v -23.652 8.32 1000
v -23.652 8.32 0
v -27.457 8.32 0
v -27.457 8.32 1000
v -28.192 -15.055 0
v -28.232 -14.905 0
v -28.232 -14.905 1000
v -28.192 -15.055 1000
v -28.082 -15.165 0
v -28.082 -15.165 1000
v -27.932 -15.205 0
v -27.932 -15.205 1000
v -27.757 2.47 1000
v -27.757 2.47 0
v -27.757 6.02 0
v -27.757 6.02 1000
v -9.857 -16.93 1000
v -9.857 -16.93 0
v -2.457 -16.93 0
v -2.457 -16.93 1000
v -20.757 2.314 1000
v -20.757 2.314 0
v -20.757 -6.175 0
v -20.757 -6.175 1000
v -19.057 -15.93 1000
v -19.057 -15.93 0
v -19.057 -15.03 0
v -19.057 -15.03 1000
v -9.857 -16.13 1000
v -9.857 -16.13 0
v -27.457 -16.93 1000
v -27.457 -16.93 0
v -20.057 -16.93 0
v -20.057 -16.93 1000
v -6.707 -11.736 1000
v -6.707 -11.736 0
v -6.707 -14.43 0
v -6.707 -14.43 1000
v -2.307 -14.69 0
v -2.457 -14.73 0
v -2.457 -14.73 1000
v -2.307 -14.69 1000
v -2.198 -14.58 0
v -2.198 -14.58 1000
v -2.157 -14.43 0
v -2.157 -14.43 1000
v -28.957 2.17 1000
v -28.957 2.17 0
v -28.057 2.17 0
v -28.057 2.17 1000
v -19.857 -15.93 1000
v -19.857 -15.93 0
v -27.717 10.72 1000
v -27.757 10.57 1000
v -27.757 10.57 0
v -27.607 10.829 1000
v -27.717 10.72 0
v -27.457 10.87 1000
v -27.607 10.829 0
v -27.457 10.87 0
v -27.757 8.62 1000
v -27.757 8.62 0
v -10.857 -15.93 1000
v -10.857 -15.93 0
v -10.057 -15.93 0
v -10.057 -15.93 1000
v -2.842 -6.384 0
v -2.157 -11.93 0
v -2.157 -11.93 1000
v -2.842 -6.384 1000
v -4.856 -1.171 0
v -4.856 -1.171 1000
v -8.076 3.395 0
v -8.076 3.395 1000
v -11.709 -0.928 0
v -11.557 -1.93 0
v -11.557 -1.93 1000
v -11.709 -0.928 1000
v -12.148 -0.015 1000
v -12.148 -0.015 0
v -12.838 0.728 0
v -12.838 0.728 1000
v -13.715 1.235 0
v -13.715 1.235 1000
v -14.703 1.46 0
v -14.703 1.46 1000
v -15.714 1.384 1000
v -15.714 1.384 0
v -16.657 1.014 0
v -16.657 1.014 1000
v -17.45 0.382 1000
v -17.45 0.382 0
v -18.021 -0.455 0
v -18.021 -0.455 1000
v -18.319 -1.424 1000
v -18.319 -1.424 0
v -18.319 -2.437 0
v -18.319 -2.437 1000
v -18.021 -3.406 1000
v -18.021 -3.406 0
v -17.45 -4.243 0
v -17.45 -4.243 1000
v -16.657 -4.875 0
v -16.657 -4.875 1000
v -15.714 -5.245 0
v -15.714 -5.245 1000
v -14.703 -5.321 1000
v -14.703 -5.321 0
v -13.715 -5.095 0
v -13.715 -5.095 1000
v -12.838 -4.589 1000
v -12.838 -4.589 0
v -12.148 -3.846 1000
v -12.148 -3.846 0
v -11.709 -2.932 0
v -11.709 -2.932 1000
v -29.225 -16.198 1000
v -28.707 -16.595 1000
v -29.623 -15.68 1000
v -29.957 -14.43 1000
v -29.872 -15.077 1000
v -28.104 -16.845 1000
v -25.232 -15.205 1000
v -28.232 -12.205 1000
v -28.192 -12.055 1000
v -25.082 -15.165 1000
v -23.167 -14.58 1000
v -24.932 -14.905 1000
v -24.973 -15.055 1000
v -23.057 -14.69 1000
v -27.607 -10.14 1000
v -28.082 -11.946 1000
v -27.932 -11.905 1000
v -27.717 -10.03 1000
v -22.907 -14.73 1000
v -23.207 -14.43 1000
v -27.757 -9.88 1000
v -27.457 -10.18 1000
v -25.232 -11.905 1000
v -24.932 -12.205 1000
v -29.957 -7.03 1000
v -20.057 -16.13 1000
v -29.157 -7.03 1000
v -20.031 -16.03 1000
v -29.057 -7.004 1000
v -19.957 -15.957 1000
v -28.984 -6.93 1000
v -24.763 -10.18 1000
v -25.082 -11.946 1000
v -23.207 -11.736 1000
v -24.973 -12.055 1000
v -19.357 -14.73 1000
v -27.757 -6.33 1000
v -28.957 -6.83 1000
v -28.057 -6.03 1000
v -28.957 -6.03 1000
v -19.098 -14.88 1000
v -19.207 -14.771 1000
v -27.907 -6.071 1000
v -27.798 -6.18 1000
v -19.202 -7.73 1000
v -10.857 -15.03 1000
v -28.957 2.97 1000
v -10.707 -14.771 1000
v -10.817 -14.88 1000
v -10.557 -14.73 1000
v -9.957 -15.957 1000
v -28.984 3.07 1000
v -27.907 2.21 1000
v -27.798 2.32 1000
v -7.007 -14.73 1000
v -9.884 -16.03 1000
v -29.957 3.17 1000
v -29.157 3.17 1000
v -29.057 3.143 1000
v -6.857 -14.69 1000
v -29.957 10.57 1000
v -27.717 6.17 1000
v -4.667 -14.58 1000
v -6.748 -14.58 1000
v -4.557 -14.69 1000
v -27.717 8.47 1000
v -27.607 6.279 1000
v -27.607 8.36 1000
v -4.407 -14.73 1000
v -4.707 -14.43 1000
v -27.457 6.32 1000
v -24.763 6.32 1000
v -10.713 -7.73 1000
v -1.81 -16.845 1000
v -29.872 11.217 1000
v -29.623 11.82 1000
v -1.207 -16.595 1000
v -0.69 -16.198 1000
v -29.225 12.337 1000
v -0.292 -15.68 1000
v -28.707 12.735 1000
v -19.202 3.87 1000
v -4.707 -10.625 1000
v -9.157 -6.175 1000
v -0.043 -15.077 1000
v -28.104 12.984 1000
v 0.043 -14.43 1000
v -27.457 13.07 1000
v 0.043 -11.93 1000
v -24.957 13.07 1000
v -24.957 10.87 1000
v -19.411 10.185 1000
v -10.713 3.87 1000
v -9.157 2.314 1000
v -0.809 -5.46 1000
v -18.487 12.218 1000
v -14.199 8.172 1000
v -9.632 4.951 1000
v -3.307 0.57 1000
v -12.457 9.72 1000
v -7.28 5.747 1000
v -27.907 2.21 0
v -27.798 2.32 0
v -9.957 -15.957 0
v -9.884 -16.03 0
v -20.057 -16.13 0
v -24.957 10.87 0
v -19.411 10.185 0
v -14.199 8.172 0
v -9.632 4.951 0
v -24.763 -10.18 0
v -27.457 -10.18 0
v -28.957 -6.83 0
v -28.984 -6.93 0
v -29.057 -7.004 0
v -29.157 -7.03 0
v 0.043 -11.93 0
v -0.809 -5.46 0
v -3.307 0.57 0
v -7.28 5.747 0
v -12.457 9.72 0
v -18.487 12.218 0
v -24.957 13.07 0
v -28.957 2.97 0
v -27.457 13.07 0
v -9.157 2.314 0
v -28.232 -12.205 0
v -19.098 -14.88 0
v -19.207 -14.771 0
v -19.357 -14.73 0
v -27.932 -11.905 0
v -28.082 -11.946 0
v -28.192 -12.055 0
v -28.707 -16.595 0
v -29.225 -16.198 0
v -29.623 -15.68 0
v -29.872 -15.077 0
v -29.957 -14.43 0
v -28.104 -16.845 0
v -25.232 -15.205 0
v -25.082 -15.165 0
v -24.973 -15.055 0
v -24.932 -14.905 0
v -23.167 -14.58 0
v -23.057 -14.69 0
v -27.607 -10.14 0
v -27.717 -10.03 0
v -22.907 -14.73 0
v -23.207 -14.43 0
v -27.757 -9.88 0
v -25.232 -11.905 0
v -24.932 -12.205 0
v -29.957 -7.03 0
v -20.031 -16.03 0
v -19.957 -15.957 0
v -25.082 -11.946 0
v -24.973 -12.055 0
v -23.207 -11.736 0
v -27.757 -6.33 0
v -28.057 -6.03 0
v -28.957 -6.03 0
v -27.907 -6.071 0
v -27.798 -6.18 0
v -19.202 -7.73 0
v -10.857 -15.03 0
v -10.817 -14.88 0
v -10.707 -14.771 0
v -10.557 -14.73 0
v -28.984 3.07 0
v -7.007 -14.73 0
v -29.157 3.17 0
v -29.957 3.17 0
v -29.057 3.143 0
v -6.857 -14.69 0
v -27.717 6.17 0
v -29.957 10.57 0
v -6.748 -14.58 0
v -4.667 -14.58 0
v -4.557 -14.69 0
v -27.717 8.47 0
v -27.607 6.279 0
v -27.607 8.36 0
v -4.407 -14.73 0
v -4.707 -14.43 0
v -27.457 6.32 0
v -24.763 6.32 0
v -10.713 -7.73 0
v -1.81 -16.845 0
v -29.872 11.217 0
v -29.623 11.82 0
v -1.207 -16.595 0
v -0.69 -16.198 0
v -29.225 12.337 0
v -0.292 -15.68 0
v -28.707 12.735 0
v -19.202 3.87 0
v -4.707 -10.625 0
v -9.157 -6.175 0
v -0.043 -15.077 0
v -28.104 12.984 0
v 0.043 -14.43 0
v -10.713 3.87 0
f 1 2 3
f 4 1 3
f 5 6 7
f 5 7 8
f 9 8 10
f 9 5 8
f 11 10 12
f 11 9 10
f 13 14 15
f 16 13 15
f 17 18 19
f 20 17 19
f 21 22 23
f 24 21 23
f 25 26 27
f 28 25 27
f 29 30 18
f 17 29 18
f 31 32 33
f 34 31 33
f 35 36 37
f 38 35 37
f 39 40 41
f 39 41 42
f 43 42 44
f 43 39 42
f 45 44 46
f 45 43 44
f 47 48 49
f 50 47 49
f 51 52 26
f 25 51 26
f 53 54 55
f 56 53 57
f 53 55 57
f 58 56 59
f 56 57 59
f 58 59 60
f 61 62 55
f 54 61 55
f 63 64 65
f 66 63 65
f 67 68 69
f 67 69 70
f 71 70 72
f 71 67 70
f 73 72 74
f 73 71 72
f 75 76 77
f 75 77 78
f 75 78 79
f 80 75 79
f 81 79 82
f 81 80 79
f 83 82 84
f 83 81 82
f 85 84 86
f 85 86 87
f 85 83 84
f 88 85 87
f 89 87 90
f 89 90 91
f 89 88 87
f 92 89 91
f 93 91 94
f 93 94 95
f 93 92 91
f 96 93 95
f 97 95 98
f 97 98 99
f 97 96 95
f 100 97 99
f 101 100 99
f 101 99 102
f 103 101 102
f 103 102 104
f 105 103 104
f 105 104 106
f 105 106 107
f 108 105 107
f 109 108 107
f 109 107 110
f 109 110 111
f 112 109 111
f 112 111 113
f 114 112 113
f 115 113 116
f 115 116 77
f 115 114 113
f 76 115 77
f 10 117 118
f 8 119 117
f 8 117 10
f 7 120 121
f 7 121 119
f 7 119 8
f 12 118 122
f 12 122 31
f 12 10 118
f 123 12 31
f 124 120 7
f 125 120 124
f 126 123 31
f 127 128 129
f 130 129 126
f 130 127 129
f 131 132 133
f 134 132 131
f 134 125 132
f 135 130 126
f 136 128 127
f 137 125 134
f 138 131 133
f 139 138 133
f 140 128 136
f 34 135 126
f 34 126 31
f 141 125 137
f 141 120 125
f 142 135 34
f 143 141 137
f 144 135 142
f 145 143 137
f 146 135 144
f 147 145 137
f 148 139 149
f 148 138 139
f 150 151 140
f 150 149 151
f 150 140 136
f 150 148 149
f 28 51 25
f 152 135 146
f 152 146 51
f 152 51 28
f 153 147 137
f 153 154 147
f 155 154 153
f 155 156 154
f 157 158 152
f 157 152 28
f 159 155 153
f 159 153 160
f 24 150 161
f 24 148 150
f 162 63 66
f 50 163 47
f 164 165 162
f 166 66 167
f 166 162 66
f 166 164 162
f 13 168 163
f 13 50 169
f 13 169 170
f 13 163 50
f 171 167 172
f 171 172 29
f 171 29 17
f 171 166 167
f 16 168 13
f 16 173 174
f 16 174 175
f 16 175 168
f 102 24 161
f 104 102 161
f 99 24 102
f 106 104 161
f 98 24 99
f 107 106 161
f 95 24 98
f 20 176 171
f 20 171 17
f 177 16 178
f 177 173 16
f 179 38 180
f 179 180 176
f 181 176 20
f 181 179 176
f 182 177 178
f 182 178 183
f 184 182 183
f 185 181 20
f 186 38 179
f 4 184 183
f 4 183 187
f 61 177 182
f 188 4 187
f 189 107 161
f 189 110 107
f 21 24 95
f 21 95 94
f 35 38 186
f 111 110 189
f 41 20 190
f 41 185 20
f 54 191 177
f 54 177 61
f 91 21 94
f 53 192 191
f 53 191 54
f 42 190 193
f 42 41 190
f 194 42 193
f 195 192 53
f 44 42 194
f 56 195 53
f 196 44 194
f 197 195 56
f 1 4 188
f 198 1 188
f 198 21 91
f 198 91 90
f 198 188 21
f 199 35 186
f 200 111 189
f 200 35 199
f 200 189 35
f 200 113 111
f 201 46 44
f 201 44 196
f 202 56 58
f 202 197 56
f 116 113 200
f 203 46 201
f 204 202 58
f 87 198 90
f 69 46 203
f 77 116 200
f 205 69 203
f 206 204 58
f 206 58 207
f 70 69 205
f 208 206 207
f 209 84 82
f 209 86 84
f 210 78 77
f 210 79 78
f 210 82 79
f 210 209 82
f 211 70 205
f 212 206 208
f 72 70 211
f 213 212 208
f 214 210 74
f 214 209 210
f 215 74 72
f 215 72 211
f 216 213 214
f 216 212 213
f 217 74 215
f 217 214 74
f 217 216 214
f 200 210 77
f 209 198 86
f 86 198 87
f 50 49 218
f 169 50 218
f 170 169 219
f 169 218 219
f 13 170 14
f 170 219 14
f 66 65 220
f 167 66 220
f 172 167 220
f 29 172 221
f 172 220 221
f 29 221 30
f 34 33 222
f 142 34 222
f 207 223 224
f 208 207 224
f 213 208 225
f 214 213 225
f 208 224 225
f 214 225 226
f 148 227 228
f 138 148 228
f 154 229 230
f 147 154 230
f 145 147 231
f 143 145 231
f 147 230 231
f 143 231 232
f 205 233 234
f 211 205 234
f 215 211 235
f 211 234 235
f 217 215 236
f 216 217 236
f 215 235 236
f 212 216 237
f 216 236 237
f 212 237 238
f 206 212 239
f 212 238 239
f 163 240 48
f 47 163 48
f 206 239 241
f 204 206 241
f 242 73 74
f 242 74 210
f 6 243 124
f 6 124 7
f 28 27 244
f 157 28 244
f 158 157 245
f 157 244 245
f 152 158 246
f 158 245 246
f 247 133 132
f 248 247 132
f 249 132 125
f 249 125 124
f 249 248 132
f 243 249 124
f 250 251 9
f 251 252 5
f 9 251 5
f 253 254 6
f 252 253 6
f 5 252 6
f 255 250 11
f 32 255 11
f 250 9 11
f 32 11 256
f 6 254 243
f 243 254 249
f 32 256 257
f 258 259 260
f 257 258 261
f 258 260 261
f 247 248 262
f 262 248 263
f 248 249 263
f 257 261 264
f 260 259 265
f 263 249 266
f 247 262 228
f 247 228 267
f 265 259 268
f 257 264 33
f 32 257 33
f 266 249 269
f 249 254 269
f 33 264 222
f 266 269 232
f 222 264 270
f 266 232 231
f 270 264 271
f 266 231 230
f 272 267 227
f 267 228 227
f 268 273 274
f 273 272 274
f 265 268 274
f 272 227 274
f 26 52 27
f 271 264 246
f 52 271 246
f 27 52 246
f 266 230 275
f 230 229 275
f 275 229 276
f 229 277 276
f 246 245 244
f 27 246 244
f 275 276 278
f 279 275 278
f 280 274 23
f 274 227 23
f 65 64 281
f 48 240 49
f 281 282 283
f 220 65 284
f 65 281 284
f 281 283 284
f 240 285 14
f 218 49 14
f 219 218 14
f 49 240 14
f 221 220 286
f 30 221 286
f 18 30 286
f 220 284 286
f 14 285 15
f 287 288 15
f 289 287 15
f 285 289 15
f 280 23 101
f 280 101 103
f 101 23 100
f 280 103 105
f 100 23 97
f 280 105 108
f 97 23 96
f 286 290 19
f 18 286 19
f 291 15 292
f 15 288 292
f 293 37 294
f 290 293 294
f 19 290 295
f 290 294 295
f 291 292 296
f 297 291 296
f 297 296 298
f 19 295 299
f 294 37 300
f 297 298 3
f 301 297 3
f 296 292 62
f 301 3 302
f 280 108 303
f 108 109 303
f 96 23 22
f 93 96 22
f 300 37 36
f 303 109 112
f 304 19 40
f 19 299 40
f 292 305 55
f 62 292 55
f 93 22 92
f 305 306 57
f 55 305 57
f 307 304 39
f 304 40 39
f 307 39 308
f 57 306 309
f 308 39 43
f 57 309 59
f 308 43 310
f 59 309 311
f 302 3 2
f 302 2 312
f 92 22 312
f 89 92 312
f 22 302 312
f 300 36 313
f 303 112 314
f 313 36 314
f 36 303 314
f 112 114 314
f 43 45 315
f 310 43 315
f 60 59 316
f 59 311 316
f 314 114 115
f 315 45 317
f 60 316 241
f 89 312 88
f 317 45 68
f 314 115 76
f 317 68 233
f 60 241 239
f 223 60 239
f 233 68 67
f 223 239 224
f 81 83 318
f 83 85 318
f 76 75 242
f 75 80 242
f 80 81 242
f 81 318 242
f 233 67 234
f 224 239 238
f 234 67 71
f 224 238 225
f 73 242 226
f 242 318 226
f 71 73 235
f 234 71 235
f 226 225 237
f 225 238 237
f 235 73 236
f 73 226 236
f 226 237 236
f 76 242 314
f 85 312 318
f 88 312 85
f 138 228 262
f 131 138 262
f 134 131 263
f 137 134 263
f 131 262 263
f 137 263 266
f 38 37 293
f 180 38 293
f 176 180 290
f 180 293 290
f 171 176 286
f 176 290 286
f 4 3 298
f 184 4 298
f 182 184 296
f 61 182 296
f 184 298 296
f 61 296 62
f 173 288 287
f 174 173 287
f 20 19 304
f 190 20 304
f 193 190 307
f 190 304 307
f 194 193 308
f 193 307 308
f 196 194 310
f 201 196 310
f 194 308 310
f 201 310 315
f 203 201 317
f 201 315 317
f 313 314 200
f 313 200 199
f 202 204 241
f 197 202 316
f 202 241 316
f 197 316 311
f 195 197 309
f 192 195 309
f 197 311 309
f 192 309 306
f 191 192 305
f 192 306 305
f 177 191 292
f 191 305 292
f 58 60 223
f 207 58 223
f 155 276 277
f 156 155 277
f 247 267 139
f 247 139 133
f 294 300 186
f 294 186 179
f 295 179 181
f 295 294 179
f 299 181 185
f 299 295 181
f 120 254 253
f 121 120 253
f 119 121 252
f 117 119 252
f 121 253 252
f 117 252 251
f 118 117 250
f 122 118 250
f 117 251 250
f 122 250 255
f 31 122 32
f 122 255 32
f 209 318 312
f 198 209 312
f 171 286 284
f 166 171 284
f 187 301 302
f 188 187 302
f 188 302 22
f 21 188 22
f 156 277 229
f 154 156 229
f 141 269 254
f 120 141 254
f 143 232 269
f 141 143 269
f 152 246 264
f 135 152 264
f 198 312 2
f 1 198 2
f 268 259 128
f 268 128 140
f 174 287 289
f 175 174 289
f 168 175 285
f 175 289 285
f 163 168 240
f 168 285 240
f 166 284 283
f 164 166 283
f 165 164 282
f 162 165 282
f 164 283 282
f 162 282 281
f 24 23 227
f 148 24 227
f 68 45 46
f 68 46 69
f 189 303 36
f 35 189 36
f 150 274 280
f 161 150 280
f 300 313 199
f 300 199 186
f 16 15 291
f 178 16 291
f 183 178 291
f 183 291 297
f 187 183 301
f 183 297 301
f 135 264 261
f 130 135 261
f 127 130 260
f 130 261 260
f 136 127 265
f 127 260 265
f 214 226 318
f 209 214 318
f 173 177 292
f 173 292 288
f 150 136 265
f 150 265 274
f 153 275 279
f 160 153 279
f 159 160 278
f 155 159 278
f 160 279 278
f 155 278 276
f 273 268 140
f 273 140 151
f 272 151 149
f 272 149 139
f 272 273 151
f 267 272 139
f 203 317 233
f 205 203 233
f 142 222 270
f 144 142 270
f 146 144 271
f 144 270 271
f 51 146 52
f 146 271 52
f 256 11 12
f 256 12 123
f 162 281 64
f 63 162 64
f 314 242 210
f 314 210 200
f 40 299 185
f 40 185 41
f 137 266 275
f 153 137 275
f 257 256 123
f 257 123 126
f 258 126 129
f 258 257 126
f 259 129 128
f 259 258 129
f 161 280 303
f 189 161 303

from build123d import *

# Parameters (mm, degrees)
SKETCH_1_R      = 3.4
EXTRUDE_1_DEPTH = 1000


with BuildPart() as part:
    # 草图1 → 凸台-拉伸1 (new body)
    with BuildSketch(Plane.XY):
        with BuildLine():
            Line((-29.957449905, -7.030330124), (-29.957449905, -14.430330124))
            ThreePointArc((-29.957449905, -14.430330124), (-29.225216858, -16.198097077), (-27.457449905, -16.930330124))
            Line((-27.457449905, -16.930330124), (-20.057449905, -16.930330124))
            Line((-20.057449905, -16.930330124), (-20.057449905, -16.130330124))
            ThreePointArc((-20.057449905, -16.130330124), (-19.998871261, -15.988908768), (-19.857449905, -15.930330124))
            Line((-19.857449905, -15.930330124), (-19.057449905, -15.930330124))
            Line((-19.057449905, -15.930330124), (-19.057449905, -15.030330124))
            ThreePointArc((-19.057449905, -15.030330124), (-19.145317871, -14.818198089), (-19.357449905, -14.730330124))
            Line((-19.357449905, -14.730330124), (-22.907449905, -14.730330124))
            ThreePointArc((-22.907449905, -14.730330124), (-23.11958194, -14.642462158), (-23.207449905, -14.430330124))
            Line((-23.207449905, -14.430330124), (-23.207449905, -11.735965042))
            Line((-23.207449905, -11.735965042), (-19.201814987, -7.730330124))
            Line((-19.201814987, -7.730330124), (-10.713084824, -7.730330124))
            Line((-10.713084824, -7.730330124), (-6.707449905, -11.735965042))
            Line((-6.707449905, -11.735965042), (-6.707449905, -14.430330124))
            ThreePointArc((-6.707449905, -14.430330124), (-6.795317871, -14.642462158), (-7.007449905, -14.730330124))
            Line((-7.007449905, -14.730330124), (-10.557449905, -14.730330124))
            ThreePointArc((-10.557449905, -14.730330124), (-10.76958194, -14.818198089), (-10.857449905, -15.030330124))
            Line((-10.857449905, -15.030330124), (-10.857449905, -15.930330124))
            Line((-10.857449905, -15.930330124), (-10.057449905, -15.930330124))
            ThreePointArc((-10.057449905, -15.930330124), (-9.916028549, -15.988908768), (-9.857449905, -16.130330124))
            Line((-9.857449905, -16.130330124), (-9.857449905, -16.930330124))
            Line((-9.857449905, -16.930330124), (-2.457449905, -16.930330124))
            ThreePointArc((-2.457449905, -16.930330124), (-0.689682952, -16.198097077), (0.042550095, -14.430330124))
            Line((0.042550095, -14.430330124), (0.042550095, -11.930330124))
            ThreePointArc((0.042550095, -11.930330124), (-7.279780376, 5.747339406), (-24.957449905, 13.069669876))
            Line((-24.957449905, 13.069669876), (-27.457449905, 13.069669876))
            ThreePointArc((-27.457449905, 13.069669876), (-29.225216858, 12.337436829), (-29.957449905, 10.569669876))
            Line((-29.957449905, 10.569669876), (-29.957449905, 3.169669876))
            Line((-29.957449905, 3.169669876), (-29.157449905, 3.169669876))
            ThreePointArc((-29.157449905, 3.169669876), (-29.016028549, 3.111091232), (-28.957449905, 2.969669876))
            Line((-28.957449905, 2.969669876), (-28.957449905, 2.169669876))
            Line((-28.957449905, 2.169669876), (-28.057449905, 2.169669876))
            ThreePointArc((-28.057449905, 2.169669876), (-27.845317871, 2.257537842), (-27.757449905, 2.469669876))
            Line((-27.757449905, 2.469669876), (-27.757449905, 6.019669876))
            ThreePointArc((-27.757449905, 6.019669876), (-27.66958194, 6.231801911), (-27.457449905, 6.319669876))
            Line((-27.457449905, 6.319669876), (-24.763084824, 6.319669876))
            Line((-24.763084824, 6.319669876), (-20.757449905, 2.314034958))
            Line((-20.757449905, 2.314034958), (-20.757449905, -6.174695205))
            Line((-20.757449905, -6.174695205), (-24.763084824, -10.180330124))
            Line((-24.763084824, -10.180330124), (-27.457449905, -10.180330124))
            ThreePointArc((-27.457449905, -10.180330124), (-27.66958194, -10.092462158), (-27.757449905, -9.880330124))
            Line((-27.757449905, -9.880330124), (-27.757449905, -6.330330124))
            ThreePointArc((-27.757449905, -6.330330124), (-27.845317871, -6.118198089), (-28.057449905, -6.030330124))
            Line((-28.057449905, -6.030330124), (-28.957449905, -6.030330124))
            Line((-28.957449905, -6.030330124), (-28.957449905, -6.830330124))
            ThreePointArc((-28.957449905, -6.830330124), (-29.016028549, -6.97175148), (-29.157449905, -7.030330124))
            Line((-29.157449905, -7.030330124), (-29.957449905, -7.030330124))
        make_face()
        with Locations((-14.957449905, -1.930330124)):
            Circle(SKETCH_1_R, mode=Mode.SUBTRACT)
        with BuildLine():
            Line((-9.632006825, 4.950747875), (-10.713084824, 3.869669876))
            Line((-10.713084824, 3.869669876), (-19.201814987, 3.869669876))
            Line((-19.201814987, 3.869669876), (-23.651814987, 8.319669876))
            Line((-23.651814987, 8.319669876), (-27.457449905, 8.319669876))
            ThreePointArc((-27.457449905, 8.319669876), (-27.66958194, 8.407537842), (-27.757449905, 8.619669876))
            Line((-27.757449905, 8.619669876), (-27.757449905, 10.569669876))
            ThreePointArc((-27.757449905, 10.569669876), (-27.66958194, 10.781801911), (-27.457449905, 10.869669876))
            Line((-27.457449905, 10.869669876), (-24.957449905, 10.869669876))
            ThreePointArc((-24.957449905, 10.869669876), (-16.743089868, 9.338527137), (-9.632006825, 4.950747875))
        make_face(mode=Mode.SUBTRACT)
        with BuildLine():
            Line((-27.932449905, -15.205330124), (-25.232449905, -15.205330124))
            ThreePointArc((-25.232449905, -15.205330124), (-25.020317871, -15.117462158), (-24.932449905, -14.905330124))
            Line((-24.932449905, -14.905330124), (-24.932449905, -12.205330124))
            ThreePointArc((-24.932449905, -12.205330124), (-25.020317871, -11.993198089), (-25.232449905, -11.905330124))
            Line((-25.232449905, -11.905330124), (-27.932449905, -11.905330124))
            ThreePointArc((-27.932449905, -11.905330124), (-28.14458194, -11.993198089), (-28.232449905, -12.205330124))
            Line((-28.232449905, -12.205330124), (-28.232449905, -14.905330124))
            ThreePointArc((-28.232449905, -14.905330124), (-28.14458194, -15.117462158), (-27.932449905, -15.205330124))
        make_face(mode=Mode.SUBTRACT)
        with BuildLine():
            Line((-8.076371906, 3.395112956), (-9.157449905, 2.314034958))
            Line((-9.157449905, 2.314034958), (-9.157449905, -6.174695205))
            Line((-9.157449905, -6.174695205), (-4.707449905, -10.624695205))
            Line((-4.707449905, -10.624695205), (-4.707449905, -14.430330124))
            ThreePointArc((-4.707449905, -14.430330124), (-4.61958194, -14.642462158), (-4.407449905, -14.730330124))
            Line((-4.407449905, -14.730330124), (-2.457449905, -14.730330124))
            ThreePointArc((-2.457449905, -14.730330124), (-2.245317871, -14.642462158), (-2.157449905, -14.430330124))
            Line((-2.157449905, -14.430330124), (-2.157449905, -11.930330124))
            ThreePointArc((-2.157449905, -11.930330124), (-3.688592644, -3.715970087), (-8.076371906, 3.395112956))
        make_face(mode=Mode.SUBTRACT)
    extrude(amount=EXTRUDE_1_DEPTH)


solid = part.part
